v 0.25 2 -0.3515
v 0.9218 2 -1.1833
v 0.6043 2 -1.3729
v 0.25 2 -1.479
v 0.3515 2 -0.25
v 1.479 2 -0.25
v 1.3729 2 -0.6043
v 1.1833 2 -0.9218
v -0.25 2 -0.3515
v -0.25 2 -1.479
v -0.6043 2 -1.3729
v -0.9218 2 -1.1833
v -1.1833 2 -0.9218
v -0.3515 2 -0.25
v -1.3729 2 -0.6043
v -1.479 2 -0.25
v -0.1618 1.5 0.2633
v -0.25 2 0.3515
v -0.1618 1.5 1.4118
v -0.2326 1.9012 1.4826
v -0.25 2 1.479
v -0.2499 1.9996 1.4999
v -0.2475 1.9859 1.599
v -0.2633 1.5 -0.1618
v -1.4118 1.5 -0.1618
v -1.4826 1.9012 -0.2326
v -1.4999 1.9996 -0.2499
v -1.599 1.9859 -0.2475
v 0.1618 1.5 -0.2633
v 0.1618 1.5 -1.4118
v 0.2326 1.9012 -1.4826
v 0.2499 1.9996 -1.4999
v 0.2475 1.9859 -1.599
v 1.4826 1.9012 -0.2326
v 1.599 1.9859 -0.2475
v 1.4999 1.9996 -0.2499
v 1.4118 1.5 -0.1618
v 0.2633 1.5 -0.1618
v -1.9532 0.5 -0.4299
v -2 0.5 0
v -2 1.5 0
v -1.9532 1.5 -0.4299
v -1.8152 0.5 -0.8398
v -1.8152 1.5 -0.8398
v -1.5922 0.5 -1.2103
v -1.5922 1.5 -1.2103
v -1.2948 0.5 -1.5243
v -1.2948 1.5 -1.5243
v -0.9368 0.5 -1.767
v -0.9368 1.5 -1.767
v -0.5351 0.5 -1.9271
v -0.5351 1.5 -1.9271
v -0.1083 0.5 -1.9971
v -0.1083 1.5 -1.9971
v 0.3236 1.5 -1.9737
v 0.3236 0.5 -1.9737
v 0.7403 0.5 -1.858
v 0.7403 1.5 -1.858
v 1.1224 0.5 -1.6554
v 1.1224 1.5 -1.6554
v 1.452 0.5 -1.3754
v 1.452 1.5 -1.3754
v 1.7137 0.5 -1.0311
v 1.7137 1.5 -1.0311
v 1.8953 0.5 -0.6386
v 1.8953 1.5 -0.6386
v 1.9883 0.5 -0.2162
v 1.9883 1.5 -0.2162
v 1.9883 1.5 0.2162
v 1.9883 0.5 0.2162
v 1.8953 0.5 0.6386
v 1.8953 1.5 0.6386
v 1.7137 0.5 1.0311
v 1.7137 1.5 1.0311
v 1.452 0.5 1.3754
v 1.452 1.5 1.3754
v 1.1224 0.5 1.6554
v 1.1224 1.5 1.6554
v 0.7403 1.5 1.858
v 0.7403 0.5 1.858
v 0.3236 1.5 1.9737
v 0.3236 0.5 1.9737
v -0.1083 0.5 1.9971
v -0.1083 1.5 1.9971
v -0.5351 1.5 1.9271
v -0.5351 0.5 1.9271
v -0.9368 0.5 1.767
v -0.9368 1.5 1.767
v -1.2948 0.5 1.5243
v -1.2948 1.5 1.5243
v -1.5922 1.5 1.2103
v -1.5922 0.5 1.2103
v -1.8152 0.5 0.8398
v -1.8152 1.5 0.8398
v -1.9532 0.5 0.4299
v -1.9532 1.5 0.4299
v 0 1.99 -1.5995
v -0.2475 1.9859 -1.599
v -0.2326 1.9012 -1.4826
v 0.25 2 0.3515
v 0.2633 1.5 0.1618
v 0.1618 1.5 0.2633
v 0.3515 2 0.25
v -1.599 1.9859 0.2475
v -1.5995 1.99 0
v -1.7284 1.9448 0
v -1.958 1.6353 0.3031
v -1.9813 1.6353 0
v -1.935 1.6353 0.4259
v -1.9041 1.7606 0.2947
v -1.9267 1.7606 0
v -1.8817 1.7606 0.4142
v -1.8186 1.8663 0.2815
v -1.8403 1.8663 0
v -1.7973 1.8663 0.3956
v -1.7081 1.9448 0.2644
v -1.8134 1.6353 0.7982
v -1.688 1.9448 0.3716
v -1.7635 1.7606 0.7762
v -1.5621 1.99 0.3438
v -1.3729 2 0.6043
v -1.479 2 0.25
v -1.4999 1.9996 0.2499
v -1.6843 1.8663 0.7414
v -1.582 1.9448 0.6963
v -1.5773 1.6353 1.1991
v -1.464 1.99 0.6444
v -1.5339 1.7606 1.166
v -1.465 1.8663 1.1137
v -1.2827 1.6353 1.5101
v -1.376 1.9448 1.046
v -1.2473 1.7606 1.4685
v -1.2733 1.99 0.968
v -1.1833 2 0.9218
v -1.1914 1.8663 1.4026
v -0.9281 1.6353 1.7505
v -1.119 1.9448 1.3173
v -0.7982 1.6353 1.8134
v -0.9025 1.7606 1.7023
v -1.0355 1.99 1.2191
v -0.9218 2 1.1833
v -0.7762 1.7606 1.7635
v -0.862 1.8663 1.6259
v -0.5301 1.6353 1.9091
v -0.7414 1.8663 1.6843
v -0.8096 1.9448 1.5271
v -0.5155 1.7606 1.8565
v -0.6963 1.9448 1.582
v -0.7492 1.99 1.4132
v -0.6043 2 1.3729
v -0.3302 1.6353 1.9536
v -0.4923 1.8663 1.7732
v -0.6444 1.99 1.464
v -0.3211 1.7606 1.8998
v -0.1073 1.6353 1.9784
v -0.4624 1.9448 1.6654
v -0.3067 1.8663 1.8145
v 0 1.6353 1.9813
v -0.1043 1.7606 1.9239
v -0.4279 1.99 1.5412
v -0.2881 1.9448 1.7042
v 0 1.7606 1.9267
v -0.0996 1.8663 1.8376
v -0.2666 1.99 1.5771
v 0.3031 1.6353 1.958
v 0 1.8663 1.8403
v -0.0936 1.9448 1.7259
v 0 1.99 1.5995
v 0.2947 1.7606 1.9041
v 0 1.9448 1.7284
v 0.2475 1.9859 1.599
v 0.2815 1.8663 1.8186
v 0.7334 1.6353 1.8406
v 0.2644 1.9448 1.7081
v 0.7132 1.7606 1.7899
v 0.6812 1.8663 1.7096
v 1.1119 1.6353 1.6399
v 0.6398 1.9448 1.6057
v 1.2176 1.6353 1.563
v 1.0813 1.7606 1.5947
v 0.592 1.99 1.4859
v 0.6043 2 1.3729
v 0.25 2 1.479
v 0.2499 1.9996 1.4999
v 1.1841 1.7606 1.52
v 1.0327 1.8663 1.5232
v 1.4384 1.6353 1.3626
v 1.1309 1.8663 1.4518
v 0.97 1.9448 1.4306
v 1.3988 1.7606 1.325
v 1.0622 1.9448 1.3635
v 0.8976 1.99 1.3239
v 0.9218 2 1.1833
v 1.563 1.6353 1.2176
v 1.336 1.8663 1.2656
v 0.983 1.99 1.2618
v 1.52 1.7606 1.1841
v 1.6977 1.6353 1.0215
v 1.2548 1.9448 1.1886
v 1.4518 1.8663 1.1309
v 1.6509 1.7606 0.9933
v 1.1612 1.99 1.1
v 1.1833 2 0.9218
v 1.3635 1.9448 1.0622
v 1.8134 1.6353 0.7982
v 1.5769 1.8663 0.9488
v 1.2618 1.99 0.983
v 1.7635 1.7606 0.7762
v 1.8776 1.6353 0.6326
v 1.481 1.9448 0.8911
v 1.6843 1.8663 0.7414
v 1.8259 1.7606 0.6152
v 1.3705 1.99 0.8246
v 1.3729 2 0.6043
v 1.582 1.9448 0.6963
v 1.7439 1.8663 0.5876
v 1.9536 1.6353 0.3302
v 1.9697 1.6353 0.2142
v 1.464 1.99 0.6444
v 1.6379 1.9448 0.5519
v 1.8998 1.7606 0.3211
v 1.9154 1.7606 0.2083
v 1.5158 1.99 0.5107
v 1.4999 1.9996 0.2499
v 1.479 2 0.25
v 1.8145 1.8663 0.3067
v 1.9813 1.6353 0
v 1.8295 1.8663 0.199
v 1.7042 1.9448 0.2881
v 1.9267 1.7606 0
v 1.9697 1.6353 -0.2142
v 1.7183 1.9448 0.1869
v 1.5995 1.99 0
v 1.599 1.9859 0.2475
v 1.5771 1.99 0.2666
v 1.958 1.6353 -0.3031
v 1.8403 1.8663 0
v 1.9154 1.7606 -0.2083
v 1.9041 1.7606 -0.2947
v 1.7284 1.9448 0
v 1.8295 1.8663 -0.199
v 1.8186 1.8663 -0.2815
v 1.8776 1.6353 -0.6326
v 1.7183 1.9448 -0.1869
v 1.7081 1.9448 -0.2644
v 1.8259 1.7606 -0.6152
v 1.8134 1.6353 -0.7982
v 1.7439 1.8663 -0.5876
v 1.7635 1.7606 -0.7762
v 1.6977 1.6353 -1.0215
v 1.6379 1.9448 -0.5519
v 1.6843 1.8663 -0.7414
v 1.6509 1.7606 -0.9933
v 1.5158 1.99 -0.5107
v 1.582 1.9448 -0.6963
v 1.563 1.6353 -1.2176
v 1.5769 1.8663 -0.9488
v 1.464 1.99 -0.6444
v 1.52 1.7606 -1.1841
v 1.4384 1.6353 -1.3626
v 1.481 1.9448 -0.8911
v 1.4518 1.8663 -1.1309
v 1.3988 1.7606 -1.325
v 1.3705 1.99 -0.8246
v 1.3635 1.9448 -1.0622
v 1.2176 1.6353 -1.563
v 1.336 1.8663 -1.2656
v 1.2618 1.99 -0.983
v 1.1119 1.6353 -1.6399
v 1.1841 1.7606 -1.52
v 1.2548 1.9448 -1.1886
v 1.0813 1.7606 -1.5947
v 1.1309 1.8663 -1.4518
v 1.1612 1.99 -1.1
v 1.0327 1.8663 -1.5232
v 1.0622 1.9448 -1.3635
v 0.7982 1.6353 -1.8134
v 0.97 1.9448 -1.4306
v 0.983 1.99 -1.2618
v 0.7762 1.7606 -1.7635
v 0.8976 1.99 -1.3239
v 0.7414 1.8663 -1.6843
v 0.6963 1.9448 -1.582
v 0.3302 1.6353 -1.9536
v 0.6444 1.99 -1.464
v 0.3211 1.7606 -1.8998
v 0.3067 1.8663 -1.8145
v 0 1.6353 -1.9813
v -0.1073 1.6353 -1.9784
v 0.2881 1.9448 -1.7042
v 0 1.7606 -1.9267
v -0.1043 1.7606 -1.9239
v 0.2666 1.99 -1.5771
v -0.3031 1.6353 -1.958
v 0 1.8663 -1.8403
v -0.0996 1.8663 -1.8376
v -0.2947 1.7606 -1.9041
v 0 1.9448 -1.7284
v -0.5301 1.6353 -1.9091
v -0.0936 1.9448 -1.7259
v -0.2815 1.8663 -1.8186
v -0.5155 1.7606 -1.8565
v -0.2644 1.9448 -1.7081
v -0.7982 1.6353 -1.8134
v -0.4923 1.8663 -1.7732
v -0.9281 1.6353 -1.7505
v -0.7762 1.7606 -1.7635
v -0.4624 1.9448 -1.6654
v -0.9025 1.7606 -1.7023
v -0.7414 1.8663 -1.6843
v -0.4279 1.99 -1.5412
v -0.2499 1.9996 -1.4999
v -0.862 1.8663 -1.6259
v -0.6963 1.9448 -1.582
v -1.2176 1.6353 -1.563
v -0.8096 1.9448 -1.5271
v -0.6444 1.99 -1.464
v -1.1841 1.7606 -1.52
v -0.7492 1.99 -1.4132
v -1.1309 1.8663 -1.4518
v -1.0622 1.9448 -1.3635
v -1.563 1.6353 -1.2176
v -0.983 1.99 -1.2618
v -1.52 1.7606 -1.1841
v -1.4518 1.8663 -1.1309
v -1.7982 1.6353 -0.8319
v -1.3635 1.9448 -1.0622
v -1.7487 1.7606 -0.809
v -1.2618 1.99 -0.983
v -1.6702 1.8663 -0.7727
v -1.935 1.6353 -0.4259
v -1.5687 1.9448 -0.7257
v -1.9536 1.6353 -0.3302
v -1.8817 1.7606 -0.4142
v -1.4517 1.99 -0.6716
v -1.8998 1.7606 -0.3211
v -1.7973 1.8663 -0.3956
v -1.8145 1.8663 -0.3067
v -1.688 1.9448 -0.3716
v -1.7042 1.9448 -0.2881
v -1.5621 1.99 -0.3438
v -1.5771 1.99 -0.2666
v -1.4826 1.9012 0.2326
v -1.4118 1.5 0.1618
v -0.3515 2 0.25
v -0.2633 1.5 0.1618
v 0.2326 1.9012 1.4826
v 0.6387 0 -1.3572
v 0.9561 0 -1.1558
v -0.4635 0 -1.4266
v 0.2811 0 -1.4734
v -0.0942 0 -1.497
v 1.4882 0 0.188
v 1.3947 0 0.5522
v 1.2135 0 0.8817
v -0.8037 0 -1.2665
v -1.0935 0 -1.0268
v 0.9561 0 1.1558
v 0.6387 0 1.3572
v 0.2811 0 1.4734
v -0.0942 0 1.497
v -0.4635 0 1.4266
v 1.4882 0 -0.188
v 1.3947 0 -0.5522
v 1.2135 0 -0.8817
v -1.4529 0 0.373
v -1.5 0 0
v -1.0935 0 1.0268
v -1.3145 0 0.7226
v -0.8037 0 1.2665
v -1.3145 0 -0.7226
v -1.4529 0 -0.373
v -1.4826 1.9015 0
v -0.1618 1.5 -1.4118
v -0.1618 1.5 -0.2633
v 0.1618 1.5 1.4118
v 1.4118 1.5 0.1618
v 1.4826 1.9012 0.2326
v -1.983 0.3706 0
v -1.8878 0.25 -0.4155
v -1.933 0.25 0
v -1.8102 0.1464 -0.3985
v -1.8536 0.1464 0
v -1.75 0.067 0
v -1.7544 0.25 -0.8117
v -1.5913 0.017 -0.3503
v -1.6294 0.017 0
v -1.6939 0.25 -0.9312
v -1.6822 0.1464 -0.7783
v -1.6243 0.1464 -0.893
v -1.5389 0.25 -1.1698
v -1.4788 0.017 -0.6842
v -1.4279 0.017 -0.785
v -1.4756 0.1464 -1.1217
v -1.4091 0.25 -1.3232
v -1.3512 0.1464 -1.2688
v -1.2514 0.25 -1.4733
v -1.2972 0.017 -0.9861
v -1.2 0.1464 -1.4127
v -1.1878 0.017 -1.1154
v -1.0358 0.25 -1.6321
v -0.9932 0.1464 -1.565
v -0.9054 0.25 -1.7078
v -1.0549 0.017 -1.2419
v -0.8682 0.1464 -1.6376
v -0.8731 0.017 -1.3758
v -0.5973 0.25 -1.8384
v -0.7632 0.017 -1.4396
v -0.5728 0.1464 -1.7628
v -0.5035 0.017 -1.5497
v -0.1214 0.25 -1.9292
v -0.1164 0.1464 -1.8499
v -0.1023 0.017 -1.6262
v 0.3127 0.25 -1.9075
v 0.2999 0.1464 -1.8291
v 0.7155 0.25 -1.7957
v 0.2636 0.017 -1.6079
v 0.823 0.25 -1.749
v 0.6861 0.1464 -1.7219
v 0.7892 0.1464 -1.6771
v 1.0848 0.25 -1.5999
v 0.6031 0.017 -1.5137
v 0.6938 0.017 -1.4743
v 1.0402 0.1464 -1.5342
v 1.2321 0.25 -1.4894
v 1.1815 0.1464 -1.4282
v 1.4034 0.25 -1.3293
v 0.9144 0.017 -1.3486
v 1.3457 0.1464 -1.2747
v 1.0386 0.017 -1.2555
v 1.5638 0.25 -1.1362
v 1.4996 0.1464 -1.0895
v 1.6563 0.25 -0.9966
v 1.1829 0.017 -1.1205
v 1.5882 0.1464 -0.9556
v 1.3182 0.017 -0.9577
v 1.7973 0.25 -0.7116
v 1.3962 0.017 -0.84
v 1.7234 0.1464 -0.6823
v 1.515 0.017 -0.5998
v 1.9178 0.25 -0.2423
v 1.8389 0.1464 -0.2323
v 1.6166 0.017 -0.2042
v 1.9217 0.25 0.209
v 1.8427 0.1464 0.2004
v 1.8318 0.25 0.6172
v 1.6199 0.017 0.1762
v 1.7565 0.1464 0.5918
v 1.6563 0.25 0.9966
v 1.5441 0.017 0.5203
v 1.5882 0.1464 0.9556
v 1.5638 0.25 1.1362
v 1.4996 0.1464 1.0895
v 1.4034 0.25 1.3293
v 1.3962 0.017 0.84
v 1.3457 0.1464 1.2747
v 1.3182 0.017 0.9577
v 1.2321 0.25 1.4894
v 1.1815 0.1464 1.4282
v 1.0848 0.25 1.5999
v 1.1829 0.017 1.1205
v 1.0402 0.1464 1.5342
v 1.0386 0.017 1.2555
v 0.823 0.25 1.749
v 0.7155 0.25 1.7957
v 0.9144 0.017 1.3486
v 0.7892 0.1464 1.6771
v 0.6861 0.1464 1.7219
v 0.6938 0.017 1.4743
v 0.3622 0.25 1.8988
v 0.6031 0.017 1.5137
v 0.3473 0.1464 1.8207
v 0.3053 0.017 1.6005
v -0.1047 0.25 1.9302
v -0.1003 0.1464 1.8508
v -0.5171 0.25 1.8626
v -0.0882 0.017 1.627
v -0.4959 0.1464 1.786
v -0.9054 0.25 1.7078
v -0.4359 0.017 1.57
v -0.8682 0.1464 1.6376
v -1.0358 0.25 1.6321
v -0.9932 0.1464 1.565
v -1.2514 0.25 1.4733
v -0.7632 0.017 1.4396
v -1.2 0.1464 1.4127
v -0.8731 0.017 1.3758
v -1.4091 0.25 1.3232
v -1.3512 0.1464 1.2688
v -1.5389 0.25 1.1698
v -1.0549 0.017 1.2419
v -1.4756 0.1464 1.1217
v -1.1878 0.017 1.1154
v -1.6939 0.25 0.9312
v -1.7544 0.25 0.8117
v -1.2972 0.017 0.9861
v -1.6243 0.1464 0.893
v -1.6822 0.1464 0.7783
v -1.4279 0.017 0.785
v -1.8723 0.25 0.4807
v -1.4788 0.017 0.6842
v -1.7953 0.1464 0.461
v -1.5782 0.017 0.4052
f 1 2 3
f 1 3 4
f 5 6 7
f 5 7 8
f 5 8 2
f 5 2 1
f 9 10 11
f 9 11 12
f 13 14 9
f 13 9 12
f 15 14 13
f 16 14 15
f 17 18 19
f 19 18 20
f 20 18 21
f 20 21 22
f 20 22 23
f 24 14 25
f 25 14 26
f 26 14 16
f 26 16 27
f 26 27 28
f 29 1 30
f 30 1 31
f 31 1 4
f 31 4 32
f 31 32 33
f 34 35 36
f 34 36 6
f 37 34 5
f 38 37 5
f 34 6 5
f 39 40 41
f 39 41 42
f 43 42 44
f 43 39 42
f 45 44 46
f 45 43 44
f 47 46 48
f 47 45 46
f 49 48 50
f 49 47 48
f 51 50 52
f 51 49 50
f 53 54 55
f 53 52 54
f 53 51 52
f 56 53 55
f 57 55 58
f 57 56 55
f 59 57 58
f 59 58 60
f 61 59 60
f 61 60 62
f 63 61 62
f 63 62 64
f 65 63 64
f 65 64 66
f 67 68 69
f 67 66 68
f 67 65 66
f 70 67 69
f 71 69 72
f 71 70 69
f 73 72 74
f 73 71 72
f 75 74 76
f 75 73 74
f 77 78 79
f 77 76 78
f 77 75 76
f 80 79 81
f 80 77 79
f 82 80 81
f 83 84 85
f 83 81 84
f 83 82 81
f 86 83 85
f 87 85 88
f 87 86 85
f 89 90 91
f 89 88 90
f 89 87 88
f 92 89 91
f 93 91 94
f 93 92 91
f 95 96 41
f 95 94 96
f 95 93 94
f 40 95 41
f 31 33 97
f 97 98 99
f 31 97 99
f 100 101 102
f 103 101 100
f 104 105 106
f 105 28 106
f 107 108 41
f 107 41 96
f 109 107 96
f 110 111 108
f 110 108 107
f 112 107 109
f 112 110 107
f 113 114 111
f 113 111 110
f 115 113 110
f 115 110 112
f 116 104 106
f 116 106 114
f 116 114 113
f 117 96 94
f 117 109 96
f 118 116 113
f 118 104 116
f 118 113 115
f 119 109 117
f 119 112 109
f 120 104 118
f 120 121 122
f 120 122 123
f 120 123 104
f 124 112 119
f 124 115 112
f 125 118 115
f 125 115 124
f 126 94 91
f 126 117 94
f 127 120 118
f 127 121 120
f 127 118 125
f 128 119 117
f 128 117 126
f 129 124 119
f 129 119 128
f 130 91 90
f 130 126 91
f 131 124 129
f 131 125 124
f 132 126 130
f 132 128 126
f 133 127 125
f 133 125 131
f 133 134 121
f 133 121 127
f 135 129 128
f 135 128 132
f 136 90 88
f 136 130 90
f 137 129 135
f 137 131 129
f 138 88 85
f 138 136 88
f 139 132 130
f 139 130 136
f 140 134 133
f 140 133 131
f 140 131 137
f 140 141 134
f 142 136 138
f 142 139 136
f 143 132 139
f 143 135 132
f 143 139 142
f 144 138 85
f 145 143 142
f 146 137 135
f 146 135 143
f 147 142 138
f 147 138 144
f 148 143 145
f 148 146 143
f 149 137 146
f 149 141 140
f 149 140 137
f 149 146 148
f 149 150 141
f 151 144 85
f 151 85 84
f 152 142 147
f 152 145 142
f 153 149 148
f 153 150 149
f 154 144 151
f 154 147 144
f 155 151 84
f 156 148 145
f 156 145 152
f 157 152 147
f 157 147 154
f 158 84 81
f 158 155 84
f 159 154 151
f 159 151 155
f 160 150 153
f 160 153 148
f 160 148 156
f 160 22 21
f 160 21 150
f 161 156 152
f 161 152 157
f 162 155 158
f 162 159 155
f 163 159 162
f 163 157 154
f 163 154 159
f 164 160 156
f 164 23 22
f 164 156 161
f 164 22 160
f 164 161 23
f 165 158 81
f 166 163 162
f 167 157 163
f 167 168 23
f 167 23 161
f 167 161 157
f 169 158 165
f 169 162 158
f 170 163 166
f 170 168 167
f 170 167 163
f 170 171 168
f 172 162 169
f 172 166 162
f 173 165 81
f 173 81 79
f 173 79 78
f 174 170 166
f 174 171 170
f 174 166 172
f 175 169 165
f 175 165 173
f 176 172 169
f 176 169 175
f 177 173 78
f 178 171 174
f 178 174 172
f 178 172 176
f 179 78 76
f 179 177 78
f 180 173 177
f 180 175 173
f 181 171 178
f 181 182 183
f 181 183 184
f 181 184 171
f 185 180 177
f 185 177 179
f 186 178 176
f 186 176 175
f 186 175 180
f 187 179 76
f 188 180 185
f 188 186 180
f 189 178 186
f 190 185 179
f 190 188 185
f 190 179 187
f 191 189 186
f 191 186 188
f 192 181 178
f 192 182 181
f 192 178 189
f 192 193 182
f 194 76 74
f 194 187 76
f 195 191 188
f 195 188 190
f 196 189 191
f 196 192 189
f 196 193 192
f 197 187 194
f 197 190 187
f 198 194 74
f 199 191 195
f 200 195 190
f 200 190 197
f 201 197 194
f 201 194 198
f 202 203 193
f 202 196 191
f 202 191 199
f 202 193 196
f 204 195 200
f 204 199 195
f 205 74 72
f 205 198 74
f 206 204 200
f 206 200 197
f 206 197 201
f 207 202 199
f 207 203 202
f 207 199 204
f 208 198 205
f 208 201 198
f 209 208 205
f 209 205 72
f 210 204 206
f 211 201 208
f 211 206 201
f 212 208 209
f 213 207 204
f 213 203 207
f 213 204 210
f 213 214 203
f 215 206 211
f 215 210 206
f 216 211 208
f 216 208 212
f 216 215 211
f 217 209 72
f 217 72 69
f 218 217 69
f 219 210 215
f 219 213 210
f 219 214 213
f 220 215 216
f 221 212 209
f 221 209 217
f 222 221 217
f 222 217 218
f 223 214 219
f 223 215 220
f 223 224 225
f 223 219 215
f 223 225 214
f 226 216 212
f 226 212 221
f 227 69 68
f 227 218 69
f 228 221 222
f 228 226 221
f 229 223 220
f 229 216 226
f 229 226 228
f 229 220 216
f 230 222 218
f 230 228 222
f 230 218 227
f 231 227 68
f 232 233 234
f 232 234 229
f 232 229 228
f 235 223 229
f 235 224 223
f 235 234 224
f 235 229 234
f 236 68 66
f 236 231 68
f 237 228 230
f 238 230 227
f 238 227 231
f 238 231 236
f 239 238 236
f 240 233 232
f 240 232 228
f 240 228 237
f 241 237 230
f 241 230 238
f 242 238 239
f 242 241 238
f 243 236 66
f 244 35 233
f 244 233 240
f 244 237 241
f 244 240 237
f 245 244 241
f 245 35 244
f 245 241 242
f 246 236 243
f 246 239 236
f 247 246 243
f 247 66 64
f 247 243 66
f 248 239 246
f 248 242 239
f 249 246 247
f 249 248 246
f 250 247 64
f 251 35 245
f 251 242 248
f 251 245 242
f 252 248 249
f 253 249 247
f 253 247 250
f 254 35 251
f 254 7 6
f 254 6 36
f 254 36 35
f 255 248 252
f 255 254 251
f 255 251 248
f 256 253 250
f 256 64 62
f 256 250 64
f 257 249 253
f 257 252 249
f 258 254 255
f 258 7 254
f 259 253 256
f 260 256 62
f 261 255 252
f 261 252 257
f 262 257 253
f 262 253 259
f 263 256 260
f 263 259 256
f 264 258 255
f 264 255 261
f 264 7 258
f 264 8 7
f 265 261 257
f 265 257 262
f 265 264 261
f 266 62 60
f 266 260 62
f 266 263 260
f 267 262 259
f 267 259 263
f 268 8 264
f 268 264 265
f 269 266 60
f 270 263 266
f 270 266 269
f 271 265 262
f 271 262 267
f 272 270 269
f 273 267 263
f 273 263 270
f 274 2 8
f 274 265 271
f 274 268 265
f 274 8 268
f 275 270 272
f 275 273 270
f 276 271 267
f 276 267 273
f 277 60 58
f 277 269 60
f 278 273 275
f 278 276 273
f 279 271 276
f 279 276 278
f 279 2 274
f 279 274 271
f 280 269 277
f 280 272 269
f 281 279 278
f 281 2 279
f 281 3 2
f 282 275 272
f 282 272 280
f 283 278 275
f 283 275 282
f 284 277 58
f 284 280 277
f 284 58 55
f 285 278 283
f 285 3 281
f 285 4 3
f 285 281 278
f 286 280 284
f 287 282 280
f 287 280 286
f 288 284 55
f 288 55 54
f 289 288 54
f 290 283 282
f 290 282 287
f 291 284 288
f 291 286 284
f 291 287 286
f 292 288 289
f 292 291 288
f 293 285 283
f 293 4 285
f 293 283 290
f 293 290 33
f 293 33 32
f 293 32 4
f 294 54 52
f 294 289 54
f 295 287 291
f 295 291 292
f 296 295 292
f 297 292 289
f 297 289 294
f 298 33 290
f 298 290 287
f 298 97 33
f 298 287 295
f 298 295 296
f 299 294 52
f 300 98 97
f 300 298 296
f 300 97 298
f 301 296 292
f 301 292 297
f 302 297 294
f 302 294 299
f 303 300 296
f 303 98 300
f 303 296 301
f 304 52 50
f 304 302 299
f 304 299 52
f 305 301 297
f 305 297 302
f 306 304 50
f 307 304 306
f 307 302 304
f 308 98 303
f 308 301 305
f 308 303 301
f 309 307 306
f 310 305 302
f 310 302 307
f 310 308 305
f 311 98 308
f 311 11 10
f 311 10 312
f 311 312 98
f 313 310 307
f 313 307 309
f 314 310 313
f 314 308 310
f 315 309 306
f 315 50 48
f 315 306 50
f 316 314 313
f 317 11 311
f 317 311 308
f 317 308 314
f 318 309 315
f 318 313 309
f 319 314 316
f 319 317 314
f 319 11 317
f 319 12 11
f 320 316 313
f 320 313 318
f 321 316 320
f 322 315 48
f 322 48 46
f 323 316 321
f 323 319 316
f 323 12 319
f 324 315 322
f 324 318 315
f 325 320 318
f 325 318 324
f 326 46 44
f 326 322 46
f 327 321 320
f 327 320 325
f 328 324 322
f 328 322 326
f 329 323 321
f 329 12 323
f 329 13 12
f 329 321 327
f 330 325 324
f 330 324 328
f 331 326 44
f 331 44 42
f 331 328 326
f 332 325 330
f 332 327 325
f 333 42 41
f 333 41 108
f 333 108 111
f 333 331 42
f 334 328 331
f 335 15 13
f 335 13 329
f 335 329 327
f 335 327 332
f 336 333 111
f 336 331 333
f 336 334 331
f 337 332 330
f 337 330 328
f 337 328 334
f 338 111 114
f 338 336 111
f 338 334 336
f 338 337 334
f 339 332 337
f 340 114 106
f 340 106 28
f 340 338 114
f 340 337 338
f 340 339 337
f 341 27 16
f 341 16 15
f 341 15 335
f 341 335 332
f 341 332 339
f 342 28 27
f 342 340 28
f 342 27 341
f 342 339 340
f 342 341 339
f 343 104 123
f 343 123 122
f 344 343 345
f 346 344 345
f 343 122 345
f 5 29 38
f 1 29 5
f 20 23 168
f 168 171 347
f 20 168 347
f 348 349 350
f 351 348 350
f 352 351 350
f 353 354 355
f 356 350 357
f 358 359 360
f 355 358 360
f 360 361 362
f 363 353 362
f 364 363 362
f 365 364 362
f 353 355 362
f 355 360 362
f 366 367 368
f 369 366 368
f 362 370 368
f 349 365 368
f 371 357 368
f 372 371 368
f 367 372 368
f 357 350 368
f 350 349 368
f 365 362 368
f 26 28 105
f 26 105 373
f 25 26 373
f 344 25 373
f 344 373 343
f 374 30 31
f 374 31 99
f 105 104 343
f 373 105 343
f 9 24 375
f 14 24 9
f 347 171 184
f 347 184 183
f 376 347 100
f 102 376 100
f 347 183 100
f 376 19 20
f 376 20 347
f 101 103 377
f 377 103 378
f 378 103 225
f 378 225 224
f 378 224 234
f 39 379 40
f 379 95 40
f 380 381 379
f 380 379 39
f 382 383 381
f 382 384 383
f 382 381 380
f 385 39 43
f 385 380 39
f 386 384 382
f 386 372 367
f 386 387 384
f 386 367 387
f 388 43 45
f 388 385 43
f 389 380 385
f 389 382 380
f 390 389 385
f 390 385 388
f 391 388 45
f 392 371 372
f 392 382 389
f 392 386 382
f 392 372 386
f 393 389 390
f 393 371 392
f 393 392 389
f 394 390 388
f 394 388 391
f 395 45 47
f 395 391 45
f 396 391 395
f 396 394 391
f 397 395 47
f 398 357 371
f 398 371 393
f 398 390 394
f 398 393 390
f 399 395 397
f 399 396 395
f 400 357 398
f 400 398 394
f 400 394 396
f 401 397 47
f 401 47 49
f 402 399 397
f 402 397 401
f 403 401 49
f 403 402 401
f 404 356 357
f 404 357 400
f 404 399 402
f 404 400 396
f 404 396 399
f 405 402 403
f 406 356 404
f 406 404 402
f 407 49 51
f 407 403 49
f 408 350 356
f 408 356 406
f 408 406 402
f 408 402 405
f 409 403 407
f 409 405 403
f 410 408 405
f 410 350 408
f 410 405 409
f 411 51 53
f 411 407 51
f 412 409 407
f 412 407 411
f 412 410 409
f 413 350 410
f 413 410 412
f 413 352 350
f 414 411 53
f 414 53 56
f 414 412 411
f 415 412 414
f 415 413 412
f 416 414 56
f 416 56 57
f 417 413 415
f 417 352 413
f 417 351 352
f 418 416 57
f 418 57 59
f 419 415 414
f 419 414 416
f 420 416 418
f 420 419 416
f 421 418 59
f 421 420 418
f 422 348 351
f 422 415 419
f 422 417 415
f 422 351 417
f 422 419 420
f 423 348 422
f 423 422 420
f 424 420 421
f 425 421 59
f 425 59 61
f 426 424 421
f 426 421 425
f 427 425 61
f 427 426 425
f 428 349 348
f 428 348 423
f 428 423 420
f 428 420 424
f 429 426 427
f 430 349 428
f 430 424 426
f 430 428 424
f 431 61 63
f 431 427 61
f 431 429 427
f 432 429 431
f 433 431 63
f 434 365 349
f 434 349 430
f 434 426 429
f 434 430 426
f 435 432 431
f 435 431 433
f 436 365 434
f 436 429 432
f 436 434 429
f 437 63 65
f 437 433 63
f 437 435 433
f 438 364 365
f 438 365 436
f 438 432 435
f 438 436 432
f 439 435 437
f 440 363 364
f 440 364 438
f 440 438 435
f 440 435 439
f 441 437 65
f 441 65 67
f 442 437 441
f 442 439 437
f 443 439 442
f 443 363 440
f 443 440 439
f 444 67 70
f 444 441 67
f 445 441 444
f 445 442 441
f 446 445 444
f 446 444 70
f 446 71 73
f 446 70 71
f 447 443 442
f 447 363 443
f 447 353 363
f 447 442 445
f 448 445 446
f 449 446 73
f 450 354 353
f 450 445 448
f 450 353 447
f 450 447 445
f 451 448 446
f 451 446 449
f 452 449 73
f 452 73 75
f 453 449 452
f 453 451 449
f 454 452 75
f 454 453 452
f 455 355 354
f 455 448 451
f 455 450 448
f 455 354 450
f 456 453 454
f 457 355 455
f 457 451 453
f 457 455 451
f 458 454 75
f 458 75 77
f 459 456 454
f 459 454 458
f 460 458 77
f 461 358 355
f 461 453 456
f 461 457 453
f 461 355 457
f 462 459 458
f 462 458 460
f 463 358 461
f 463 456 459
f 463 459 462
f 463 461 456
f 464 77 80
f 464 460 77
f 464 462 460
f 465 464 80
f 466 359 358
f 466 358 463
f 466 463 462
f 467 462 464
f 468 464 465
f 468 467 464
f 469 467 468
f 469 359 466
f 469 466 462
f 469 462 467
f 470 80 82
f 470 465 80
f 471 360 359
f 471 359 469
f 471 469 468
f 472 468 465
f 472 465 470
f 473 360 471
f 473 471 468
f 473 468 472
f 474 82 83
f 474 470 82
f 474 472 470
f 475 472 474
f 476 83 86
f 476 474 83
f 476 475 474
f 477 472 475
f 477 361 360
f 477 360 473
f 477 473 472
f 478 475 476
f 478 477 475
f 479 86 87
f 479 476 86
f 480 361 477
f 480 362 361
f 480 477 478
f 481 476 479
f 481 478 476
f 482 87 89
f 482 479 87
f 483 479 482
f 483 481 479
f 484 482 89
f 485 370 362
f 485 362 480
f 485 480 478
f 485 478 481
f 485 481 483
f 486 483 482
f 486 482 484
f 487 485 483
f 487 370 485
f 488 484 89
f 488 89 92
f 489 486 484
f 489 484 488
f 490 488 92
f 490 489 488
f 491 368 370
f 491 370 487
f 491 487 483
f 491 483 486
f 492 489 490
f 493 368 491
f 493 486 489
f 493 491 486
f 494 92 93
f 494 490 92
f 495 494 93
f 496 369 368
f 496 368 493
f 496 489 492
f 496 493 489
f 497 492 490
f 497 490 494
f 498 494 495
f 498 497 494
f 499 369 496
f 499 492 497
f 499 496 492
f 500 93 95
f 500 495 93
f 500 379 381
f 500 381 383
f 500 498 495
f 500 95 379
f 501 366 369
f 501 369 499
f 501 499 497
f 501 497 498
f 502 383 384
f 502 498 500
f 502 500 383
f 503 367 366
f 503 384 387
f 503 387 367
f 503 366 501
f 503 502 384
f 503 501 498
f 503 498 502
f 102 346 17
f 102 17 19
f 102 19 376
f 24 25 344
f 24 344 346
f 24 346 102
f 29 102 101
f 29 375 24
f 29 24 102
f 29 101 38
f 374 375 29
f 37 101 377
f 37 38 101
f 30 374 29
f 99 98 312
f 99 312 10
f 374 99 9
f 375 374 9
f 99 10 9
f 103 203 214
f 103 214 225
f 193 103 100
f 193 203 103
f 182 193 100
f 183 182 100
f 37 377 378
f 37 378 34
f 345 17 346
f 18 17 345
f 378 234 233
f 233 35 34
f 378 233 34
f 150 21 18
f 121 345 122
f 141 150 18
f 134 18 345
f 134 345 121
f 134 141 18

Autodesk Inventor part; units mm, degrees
ref_plane "YZ Plane" through (0, 0, 0) normal (1, 0, 0) x (0, 1, 0)
ref_plane "XZ Plane" through (0, 0, 0) normal (0, 1, 0) x (-1, 0, 0)
ref_plane "XY Plane" through (0, 0, 0) normal (0, 0, 1) x (1, 0, 0)
sketch "Sketch1" plane through (0, 0, 0) normal (0, 1, 0) x (-1, 0, 0)
  circle A0 centre (0, 0) radius 2
  dimension "d0" = 4
extrude "Extrusion1" add sketch "Sketch1" along normal blind 2
fillet "Fillet1" radius 0.5 2 edges at (2, 2, 0) (2, 0, 0)
sketch "Sketch2" plane through (0, 2, 0) normal (0, 1, 0) x (1, 0, 0)
  line L0 (0.25, 1.5) -> (-0.25, 1.5)
  line L1 (-0.25, -1.5) -> (0.25, -1.5)
  line L2 (0.25, -1.5) -> (-0.25, 1.5) construction
  line L3 (0.25, 1.5) -> (-0.25, -1.5) construction
  line L4 (0.25, 1.5) -> (-0.25, 1.5)
  line L5 (-0.25, -1.5) -> (0.25, -1.5)
  line L6 (0.25, -1.5) -> (-0.25, 1.5) construction
  line L7 (0.25, 1.5) -> (-0.25, -1.5) construction
  line L8 (1.5, -0.25) -> (1.5, 0.25)
  line L9 (-1.5, 0.25) -> (-1.5, -0.25)
  line L10 (-1.5, -0.25) -> (1.5, 0.25) construction
  line L11 (1.5, -0.25) -> (-1.5, 0.25) construction
  line L12 (1.5, -0.25) -> (1.5, 0.25)
  line L13 (-1.5, 0.25) -> (-1.5, -0.25)
  line L14 (-1.5, -0.25) -> (1.5, 0.25) construction
  line L15 (1.5, -0.25) -> (-1.5, 0.25) construction
  line L16 (-0.25, 1.5) -> (-0.25, 0.25)
  line L17 (-0.25, -0.25) -> (-0.25, -1.5)
  line L18 (-1.5, -0.25) -> (-0.25, -0.25)
  line L19 (0.25, -0.25) -> (1.5, -0.25)
  line L20 (0.25, -1.5) -> (0.25, -0.25)
  line L21 (0.25, 0.25) -> (0.25, 1.5)
  line L22 (1.5, 0.25) -> (0.25, 0.25)
  line L23 (-0.25, 0.25) -> (-1.5, 0.25)
  line L24 (-1.5, -0.25) -> (-0.25, -0.25)
  line L25 (0.25, -0.25) -> (1.5, -0.25)
  line L26 (0.25, -1.5) -> (0.25, -0.25)
  line L27 (0.25, 0.25) -> (0.25, 1.5)
  line L28 (1.5, 0.25) -> (0.25, 0.25)
  line L29 (-0.25, 0.25) -> (-1.5, 0.25)
  line L30 (-0.25, 1.5) -> (-0.25, 0.25)
  line L31 (-0.25, -0.25) -> (-0.25, -1.5)
  point P0 (0, 0)
  point P1 (0, 0)
  dimension "d5" = 0.5
  dimension "d8" = 3
  dimension "d9" = 0.5
  dimension "d10" = 3
extrude "Extrusion2" cut sketch "Sketch2" against normal blind 0.5 draft -10
chamfer "Chamfer1" distance 0.1 angle 45 12 edges at (-1.5, 2, 0.1259) (-1.5, 2, -0.1259) (-0.2059, 1.75, 0.2059) (-0.2059, 1.75, -0.2059) (0.2059, 1.75, -0.2059) (0.2059, 1.75, 0.2059) (0.1259, 2, -1.5) (-0.1259, 2, -1.5) (1.5, 2, 0.1259) (1.5, 2, -0.1259) (-0.1259, 2, 1.5) (0.1259, 2, 1.5)
properties part number "Kepala Baut"
